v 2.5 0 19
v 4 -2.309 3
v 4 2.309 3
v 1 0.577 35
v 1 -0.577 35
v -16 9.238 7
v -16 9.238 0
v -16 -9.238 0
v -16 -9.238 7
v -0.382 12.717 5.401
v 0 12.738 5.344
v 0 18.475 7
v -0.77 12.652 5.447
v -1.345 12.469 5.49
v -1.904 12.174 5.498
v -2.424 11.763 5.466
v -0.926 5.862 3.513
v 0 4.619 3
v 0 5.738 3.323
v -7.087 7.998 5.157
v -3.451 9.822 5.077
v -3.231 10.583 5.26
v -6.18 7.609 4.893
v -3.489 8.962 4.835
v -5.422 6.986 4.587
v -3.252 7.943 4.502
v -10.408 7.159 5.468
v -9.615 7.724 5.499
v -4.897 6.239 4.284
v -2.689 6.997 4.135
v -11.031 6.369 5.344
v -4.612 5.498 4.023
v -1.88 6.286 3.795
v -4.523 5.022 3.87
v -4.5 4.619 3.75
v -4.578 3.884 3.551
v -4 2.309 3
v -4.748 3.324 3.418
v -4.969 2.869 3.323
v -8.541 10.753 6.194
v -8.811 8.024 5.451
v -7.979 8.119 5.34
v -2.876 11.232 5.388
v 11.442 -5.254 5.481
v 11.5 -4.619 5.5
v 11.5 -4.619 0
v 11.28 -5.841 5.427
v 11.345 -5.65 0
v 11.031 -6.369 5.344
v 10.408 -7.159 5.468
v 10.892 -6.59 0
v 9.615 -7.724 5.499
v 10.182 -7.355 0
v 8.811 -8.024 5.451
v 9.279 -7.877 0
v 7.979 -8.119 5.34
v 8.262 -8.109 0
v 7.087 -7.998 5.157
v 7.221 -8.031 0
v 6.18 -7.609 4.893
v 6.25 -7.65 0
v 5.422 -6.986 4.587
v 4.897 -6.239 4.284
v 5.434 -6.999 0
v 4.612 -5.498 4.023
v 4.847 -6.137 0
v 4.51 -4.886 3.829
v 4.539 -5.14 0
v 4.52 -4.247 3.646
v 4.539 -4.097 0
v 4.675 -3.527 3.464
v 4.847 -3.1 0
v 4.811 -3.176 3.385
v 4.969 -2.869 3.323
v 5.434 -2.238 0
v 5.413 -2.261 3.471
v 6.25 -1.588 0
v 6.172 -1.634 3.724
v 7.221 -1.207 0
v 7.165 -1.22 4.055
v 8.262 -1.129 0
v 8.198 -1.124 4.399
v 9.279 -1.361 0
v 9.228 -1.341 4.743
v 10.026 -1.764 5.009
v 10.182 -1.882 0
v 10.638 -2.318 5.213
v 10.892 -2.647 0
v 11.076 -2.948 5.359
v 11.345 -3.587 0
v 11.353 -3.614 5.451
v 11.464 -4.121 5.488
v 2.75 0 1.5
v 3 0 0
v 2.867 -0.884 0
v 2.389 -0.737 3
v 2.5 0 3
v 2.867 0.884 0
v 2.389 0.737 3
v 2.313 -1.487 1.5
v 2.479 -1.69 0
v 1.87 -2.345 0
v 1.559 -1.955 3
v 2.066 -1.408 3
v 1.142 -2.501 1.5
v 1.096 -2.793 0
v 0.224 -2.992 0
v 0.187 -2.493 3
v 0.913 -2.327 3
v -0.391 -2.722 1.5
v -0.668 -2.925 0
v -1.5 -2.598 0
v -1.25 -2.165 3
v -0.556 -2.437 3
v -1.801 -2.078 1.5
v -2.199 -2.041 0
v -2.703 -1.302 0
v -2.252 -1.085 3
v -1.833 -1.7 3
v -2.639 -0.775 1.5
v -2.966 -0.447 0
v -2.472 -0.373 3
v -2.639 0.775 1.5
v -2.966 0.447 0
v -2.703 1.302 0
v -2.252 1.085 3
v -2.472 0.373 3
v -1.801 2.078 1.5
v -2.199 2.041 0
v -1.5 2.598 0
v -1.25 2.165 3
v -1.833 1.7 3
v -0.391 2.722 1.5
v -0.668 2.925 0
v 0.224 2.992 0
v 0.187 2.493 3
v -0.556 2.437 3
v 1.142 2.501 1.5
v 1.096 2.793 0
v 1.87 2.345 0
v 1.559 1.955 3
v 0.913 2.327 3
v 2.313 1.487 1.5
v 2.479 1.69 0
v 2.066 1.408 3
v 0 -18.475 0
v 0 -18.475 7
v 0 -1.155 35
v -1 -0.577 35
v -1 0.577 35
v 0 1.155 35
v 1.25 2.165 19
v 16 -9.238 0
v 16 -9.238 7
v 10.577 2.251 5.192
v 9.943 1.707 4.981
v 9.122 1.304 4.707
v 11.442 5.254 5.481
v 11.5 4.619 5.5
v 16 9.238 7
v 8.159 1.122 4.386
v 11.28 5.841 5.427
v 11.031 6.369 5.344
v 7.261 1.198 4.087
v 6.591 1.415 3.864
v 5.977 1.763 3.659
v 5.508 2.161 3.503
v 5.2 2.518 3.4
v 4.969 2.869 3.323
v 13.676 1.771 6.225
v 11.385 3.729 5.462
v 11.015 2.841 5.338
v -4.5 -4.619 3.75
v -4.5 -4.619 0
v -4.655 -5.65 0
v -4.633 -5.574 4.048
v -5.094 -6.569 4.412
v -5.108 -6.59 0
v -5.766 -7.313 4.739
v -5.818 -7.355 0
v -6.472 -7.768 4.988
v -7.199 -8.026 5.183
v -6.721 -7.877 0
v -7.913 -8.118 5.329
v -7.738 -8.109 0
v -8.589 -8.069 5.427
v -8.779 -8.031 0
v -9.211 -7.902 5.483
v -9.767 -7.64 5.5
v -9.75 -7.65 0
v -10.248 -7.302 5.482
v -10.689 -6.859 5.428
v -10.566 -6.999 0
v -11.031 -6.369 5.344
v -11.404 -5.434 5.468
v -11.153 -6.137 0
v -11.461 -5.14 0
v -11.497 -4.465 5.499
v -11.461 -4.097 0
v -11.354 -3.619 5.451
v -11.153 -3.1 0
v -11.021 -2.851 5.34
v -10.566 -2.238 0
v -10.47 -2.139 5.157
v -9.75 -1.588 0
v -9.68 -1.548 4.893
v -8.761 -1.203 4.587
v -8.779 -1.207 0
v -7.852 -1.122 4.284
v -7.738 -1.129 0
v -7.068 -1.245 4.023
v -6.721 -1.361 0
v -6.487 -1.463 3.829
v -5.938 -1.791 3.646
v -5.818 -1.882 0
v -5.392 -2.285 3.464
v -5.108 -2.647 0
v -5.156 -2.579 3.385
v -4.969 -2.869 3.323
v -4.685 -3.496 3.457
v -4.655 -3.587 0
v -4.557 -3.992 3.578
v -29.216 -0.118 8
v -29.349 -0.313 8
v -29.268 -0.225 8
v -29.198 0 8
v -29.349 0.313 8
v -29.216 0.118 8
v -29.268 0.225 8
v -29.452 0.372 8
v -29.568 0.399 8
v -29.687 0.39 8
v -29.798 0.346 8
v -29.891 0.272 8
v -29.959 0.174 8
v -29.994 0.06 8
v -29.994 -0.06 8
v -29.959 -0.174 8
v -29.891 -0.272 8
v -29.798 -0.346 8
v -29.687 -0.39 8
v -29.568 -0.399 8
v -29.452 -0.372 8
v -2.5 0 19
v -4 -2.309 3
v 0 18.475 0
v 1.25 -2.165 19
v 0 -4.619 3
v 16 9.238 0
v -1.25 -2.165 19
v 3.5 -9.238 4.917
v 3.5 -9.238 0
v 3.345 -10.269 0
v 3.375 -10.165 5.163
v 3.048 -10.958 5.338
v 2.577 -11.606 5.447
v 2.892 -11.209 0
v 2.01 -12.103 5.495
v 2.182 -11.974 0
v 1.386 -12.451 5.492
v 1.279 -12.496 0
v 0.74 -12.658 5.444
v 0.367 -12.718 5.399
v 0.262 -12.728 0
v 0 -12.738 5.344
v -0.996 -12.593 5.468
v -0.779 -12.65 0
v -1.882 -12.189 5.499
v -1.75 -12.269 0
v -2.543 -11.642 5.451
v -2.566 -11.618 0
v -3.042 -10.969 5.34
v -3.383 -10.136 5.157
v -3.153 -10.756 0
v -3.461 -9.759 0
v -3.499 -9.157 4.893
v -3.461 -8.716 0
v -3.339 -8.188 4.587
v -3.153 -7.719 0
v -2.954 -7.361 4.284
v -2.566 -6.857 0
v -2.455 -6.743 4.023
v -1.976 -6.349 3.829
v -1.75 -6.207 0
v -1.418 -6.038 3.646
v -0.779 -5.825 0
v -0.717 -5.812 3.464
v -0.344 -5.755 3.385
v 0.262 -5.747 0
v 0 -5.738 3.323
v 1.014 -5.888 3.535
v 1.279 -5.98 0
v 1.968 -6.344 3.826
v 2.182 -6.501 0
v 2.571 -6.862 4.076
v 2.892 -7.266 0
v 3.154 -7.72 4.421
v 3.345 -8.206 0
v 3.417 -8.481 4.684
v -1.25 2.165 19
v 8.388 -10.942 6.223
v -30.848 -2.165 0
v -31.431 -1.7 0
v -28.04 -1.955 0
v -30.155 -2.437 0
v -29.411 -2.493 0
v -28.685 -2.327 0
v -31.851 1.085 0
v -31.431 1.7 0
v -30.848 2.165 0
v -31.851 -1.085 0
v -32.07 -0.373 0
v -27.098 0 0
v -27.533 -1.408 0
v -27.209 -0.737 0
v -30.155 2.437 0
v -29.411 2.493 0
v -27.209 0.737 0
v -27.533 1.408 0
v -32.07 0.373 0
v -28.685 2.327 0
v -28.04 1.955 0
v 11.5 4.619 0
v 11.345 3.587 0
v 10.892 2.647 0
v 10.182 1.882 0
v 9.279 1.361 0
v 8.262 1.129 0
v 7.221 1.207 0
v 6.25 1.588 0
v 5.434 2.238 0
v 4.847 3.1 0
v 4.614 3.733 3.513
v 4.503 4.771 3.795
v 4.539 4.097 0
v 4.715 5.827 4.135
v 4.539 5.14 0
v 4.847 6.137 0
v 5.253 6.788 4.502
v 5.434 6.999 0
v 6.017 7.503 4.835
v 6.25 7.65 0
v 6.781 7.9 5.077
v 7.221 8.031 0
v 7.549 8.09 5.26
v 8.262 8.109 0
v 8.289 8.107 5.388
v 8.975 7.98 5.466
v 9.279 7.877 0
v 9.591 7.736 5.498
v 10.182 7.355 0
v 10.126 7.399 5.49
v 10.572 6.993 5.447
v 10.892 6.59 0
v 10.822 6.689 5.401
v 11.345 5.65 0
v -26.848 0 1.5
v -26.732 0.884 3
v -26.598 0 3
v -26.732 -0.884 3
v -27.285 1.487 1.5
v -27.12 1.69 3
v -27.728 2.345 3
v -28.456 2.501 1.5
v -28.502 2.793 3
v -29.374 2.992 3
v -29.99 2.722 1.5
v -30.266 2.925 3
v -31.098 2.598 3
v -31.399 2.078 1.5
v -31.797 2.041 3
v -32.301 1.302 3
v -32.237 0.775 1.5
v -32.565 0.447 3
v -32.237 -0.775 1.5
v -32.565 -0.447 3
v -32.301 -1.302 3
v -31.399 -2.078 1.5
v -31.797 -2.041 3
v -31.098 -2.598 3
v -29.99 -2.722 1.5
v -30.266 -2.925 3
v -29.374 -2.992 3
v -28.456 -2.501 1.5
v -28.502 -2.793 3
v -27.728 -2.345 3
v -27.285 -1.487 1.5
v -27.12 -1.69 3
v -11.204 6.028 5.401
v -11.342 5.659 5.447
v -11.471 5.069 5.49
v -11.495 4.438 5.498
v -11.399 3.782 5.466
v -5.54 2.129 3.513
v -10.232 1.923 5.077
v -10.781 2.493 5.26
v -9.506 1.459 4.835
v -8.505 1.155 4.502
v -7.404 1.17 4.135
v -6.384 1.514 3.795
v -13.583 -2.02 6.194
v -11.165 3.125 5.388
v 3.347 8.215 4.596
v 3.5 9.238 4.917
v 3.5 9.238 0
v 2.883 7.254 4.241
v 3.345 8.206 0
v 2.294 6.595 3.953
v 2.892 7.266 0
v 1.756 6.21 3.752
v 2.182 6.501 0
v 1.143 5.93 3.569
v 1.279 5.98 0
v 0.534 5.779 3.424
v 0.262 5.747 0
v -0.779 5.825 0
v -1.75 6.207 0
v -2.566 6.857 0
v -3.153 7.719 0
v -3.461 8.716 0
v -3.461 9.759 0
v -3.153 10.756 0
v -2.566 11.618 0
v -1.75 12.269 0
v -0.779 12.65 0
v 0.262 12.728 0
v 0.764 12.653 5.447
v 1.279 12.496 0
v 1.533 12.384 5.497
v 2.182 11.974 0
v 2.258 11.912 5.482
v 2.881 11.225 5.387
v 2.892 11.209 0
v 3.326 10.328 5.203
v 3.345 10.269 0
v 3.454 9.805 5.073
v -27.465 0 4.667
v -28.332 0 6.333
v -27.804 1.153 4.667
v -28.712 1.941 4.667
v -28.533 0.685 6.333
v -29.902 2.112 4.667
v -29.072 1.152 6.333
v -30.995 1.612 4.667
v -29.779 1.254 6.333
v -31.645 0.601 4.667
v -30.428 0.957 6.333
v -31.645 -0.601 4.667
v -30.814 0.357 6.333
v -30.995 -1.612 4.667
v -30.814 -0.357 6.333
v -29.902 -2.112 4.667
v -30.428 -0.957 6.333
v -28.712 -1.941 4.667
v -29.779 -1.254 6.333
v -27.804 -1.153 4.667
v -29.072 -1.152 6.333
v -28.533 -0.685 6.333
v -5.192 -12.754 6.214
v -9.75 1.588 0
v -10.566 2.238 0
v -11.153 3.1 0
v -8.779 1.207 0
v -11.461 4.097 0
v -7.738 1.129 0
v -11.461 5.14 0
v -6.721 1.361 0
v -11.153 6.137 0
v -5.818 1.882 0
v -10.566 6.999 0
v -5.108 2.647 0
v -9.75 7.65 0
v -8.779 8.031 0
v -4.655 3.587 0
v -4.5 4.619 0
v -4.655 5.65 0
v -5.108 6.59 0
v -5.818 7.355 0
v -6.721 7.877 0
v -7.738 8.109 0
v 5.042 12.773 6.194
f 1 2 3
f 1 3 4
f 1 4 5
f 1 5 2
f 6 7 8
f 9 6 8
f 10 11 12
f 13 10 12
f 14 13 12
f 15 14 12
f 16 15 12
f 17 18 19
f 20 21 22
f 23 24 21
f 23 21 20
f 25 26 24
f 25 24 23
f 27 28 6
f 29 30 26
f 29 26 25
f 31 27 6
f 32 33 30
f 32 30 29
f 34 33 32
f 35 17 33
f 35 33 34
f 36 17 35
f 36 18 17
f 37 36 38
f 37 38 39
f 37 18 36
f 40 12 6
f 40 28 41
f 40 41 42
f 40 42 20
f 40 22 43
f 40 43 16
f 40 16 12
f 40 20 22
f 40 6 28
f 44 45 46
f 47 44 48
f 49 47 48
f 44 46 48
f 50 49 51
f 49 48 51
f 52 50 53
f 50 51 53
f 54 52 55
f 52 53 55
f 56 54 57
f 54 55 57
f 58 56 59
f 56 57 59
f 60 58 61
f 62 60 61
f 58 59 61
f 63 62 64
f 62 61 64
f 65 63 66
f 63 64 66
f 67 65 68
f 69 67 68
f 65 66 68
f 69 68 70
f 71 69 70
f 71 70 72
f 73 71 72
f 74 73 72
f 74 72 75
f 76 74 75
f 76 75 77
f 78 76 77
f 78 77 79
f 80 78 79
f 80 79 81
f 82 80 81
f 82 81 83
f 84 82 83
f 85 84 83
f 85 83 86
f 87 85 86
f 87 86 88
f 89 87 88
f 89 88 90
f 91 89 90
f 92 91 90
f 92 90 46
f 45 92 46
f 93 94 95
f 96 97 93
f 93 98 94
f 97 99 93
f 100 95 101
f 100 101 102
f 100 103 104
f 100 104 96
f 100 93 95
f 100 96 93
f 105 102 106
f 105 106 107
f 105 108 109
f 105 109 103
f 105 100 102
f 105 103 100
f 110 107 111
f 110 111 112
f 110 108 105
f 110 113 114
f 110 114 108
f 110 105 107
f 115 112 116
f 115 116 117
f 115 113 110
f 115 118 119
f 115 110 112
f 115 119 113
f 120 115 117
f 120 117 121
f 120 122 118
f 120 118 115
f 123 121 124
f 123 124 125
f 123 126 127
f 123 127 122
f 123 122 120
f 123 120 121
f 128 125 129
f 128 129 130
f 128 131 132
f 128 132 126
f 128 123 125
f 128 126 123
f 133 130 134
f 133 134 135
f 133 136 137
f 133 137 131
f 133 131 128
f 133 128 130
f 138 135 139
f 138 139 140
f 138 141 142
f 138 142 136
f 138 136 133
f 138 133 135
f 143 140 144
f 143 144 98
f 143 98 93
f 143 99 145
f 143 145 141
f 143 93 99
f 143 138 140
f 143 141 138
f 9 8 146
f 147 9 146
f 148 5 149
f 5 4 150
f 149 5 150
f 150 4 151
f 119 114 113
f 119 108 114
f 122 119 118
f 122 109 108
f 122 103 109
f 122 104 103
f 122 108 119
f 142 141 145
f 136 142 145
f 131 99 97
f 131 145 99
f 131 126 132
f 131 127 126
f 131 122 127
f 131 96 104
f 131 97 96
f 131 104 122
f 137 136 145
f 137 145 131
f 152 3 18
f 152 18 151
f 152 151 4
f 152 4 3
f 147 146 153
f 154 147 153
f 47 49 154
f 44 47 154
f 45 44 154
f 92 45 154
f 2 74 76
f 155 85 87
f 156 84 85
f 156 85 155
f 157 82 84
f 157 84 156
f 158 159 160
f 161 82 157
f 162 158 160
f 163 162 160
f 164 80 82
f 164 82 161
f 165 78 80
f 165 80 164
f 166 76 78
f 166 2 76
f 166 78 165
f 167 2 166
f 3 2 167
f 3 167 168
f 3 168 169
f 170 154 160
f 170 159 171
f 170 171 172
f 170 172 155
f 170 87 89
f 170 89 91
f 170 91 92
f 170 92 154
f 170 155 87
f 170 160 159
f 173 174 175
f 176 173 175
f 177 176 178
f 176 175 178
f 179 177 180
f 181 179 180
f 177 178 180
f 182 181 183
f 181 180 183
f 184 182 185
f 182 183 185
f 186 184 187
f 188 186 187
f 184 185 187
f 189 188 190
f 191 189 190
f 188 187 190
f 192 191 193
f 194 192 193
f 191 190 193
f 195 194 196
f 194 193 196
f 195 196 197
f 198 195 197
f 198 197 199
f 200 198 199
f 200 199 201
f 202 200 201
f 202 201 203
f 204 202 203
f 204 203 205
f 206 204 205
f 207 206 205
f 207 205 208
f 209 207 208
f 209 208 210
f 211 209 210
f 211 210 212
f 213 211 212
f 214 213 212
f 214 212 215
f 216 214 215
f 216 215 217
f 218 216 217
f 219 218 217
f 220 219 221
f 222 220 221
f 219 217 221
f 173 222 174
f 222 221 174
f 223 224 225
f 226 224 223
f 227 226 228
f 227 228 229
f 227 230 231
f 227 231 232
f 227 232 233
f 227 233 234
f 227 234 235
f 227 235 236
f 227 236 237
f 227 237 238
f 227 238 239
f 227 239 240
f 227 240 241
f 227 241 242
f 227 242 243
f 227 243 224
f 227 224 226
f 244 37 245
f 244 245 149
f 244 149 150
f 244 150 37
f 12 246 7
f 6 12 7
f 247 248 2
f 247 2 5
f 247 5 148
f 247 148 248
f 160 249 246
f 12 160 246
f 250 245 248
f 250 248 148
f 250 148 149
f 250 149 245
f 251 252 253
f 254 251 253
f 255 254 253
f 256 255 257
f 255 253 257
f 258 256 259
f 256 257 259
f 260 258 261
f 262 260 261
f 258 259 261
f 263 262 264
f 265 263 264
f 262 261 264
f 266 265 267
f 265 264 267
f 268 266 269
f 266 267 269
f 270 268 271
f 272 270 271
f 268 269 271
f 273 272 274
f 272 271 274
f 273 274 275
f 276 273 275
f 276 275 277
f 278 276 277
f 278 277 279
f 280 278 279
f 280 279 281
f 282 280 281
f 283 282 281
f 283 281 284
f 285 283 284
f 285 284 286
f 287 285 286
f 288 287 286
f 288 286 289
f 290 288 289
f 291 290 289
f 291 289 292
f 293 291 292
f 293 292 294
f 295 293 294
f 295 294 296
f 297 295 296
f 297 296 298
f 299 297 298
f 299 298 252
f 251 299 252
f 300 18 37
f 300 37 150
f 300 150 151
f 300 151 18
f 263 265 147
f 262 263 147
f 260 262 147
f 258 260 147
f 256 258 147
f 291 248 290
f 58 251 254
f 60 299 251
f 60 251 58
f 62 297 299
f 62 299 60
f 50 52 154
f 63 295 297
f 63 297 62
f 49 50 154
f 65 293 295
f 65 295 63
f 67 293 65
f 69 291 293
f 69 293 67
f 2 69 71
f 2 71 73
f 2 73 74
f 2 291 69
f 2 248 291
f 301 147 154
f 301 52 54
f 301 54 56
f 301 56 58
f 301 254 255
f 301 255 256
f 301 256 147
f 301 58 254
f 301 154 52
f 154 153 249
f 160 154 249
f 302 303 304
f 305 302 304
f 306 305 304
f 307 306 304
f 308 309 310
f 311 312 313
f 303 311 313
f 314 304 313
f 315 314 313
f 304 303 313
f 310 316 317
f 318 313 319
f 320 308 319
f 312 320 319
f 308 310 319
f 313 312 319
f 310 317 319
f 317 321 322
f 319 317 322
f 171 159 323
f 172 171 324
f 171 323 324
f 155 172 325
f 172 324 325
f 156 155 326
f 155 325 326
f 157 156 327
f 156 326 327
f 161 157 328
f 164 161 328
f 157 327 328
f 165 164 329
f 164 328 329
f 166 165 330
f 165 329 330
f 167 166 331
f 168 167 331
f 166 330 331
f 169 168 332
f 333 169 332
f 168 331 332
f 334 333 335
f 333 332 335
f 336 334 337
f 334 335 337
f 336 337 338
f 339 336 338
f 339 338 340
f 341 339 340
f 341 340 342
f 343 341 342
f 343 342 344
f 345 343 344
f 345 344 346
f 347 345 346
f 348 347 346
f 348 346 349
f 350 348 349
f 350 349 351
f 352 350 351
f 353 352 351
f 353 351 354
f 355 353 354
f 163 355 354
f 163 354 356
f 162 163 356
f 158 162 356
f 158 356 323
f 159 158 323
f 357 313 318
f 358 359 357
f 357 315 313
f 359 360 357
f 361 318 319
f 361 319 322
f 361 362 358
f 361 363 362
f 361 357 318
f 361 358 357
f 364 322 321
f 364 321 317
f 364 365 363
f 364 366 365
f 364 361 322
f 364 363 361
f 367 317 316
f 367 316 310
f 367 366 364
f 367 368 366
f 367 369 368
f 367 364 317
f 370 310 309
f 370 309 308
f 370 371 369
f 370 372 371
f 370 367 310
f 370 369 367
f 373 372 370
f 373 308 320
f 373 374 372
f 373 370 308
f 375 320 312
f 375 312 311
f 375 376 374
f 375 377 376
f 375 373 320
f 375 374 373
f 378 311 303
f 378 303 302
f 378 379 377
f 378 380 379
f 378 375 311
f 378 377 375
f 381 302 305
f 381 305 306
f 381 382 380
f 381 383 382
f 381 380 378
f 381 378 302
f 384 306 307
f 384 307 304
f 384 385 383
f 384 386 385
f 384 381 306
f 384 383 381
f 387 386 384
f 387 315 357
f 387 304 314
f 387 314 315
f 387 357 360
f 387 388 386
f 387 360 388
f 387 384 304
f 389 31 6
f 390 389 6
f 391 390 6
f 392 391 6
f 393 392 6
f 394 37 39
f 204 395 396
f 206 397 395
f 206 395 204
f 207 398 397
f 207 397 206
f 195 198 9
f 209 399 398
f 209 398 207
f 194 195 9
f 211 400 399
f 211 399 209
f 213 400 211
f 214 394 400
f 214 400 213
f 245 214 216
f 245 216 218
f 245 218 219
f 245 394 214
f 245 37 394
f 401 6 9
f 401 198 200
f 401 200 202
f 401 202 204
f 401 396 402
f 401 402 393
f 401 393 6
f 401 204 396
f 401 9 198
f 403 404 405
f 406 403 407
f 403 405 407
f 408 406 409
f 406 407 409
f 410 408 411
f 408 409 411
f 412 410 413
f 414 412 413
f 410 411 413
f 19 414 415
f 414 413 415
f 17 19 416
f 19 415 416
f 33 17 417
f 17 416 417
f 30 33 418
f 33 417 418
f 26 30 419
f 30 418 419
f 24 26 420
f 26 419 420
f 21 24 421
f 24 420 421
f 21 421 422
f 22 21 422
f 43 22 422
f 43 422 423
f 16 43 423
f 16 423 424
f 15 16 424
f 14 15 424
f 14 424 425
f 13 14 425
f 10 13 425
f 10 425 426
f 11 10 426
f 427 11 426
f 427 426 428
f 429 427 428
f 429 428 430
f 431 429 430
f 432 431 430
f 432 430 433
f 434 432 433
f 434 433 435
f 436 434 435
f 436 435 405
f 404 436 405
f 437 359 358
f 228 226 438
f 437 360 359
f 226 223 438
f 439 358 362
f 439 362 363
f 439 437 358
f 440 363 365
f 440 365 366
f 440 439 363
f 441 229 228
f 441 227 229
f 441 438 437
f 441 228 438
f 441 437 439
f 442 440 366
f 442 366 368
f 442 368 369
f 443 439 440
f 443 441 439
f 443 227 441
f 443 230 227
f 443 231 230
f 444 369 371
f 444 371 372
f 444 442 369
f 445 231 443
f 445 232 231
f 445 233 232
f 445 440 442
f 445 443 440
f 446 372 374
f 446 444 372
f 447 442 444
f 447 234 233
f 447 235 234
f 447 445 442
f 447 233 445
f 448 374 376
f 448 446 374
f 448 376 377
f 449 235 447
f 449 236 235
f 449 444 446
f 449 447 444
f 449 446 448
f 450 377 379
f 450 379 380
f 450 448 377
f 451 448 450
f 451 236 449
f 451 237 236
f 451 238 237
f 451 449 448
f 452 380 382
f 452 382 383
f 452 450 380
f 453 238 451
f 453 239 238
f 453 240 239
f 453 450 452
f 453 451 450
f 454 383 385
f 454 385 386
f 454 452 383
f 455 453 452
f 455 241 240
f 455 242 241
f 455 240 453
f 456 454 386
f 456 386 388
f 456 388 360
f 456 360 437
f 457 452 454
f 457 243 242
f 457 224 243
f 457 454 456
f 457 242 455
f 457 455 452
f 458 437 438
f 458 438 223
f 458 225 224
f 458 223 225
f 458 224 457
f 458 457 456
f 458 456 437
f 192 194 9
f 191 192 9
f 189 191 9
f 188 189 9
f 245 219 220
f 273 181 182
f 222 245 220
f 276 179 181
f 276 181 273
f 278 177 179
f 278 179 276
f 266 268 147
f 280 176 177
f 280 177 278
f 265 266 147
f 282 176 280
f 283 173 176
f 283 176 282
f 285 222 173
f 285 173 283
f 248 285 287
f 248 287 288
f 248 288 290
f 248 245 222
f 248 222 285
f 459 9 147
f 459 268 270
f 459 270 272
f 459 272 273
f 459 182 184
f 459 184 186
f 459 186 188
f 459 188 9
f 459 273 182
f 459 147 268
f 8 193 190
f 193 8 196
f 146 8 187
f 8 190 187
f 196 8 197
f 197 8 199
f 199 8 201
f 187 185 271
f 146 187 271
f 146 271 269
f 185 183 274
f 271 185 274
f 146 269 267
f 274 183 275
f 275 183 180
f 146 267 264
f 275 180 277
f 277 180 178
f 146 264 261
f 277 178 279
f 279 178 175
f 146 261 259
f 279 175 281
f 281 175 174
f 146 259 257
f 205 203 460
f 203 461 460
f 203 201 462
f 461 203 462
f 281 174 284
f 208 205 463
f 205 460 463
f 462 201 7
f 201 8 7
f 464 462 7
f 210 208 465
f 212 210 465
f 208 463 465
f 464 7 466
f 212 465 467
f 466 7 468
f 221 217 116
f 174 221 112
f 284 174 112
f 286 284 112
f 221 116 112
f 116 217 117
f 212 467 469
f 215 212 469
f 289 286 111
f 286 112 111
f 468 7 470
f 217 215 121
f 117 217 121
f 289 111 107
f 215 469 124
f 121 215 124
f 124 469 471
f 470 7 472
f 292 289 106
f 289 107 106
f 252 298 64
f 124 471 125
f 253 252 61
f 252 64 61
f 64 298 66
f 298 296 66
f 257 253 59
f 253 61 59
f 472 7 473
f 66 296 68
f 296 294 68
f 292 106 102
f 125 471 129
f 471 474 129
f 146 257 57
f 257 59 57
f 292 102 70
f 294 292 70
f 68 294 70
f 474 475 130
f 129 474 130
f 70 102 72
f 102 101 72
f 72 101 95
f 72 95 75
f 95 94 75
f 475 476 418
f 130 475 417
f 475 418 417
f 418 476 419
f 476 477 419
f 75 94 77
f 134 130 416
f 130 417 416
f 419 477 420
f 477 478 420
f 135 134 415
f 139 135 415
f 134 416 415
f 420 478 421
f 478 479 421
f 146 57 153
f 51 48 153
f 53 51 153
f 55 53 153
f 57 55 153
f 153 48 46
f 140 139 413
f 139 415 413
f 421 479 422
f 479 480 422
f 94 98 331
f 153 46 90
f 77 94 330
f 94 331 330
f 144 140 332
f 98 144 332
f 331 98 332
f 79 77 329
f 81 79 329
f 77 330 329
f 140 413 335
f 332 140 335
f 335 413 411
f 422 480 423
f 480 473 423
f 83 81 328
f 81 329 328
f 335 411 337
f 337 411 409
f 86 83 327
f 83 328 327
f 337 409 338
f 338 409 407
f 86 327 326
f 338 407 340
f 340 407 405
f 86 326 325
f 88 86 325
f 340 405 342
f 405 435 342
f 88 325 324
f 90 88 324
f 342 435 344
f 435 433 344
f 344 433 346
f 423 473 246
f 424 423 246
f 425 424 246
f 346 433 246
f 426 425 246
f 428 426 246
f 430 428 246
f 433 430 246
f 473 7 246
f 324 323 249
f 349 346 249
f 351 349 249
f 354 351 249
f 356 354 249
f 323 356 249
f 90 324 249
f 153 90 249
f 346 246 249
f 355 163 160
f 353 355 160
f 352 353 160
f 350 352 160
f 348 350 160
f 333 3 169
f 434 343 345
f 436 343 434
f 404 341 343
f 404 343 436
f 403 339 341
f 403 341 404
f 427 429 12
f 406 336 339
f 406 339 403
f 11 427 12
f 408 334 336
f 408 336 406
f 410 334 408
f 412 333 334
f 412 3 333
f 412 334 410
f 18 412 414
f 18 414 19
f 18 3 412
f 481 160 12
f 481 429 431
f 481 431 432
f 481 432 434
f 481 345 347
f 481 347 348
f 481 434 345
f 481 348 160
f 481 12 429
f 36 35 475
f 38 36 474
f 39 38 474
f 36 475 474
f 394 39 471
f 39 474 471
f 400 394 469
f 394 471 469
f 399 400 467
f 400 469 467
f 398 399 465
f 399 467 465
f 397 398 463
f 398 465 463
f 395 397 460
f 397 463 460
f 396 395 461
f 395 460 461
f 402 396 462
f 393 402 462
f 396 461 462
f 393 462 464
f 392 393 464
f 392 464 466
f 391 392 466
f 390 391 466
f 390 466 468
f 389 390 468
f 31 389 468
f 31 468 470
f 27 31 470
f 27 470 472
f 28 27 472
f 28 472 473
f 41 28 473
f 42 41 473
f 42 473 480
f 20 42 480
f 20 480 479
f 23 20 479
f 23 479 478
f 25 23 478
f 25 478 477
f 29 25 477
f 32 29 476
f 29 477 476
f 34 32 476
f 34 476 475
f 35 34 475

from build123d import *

# Parameters (mm, degrees)
F1_DEPTH   = 7
F5_R       = 3
F6_R       = 2.5
F8_R       = 3.5
F9_DEPTH   = 7
F14_R      = 2.5
F16_R      = 3
F19_FACE_R = 3
F18_R      = 0.4


with BuildPart() as f1:
    # F0 (on Top) → F1 (new body)
    with BuildSketch(Plane.XY):
        Polygon((16, -9.237604307), (16, 9.237604307), (0, 18.4752086141), (-16, 9.237604307), (-16, -9.237604307), (0, -18.4752086141), align=None)
    extrude(amount=F1_DEPTH)

    # F1_face (on face) → F4 section 0
    with BuildSketch(Plane.XY.offset(7)):
        Polygon((0, -18.4752086141), (16, -9.237604307), (16, 9.237604307), (0, 18.4752086141), (-16, 9.237604307), (-16, -9.237604307), align=None)
    # F3 (on offset) → F4 section 1
    with BuildSketch(Plane.XY.offset(3)):
        Polygon((4, -2.3094010768), (4, 2.3094010768), (0, 4.6188021535), (-4, 2.3094010768), (-4, -2.3094010768), (0, -4.6188021535), align=None)
    loft(mode=Mode.SUBTRACT)

    # F5 (on face) → F7 section 0
    with BuildSketch(Plane(origin=(0, 0, 0), x_dir=(1, 0, 0), z_dir=(0, 0, -1))):
        Circle(F5_R)
    # F6 (on offset) → F7 section 1
    with BuildSketch(Plane.XY.offset(3)):
        Circle(F6_R)
    loft(mode=Mode.SUBTRACT)

    # F8 (on face) → F9 (cut)
    with BuildSketch(Plane(origin=(0, 0, 0), x_dir=(1, 0, 0), z_dir=(0, 0, -1))):
        with Locations((-8, 4.6188021535)):
            Circle(F8_R)
        with Locations((0, 9.237604307)):
            Circle(F8_R)
        with Locations((8, 4.6188021535)):
            Circle(F8_R)
        with Locations((8, -4.6188021535)):
            Circle(F8_R)
        with Locations((0, -9.237604307)):
            Circle(F8_R)
        with Locations((-8, -4.6188021535)):
            Circle(F8_R)
    extrude(amount=-F9_DEPTH, mode=Mode.SUBTRACT)

    # F12 (on face) → F13 section 0
    with BuildSketch(Plane.XY.offset(3)):
        Polygon((4, -2.3094010768), (4, 2.3094010768), (0, 4.6188021535), (-4, 2.3094010768), (-4, -2.3094010768), (0, -4.6188021535), align=None)
    # F11 (on offset) → F13 section 1
    with BuildSketch(Plane.XY.offset(35)):
        Polygon((1, -0.5773502692), (1, 0.5773502692), (0, 1.1547005384), (-1, 0.5773502692), (-1, -0.5773502692), (0, -1.1547005384), align=None)
    loft()


with BuildPart() as f19:
    # F14 (on Top) → F19 section 0
    with BuildSketch(Plane.XY):
        with Locations((-29.5982741499, 0)):
            Circle(F14_R)
    # F16 (on offset) → F19 section 1
    with BuildSketch(Plane.XY.offset(3)):
        with Locations((-29.5982741499, 0)):
            Circle(F16_R)
    loft()

    # F19_face (on face) → F20 section 0
    with BuildSketch(Plane(origin=(-29.5982741499, 0, 3), x_dir=(1, 0, 0), z_dir=(0, 0, 1))):
        Circle(F19_FACE_R)
    # F18 (on offset) → F20 section 1
    with BuildSketch(Plane.XY.offset(8)):
        with Locations((-29.5982741499, 0)):
            Circle(F18_R)
    loft()


solid = Compound([f1.part, f19.part])
